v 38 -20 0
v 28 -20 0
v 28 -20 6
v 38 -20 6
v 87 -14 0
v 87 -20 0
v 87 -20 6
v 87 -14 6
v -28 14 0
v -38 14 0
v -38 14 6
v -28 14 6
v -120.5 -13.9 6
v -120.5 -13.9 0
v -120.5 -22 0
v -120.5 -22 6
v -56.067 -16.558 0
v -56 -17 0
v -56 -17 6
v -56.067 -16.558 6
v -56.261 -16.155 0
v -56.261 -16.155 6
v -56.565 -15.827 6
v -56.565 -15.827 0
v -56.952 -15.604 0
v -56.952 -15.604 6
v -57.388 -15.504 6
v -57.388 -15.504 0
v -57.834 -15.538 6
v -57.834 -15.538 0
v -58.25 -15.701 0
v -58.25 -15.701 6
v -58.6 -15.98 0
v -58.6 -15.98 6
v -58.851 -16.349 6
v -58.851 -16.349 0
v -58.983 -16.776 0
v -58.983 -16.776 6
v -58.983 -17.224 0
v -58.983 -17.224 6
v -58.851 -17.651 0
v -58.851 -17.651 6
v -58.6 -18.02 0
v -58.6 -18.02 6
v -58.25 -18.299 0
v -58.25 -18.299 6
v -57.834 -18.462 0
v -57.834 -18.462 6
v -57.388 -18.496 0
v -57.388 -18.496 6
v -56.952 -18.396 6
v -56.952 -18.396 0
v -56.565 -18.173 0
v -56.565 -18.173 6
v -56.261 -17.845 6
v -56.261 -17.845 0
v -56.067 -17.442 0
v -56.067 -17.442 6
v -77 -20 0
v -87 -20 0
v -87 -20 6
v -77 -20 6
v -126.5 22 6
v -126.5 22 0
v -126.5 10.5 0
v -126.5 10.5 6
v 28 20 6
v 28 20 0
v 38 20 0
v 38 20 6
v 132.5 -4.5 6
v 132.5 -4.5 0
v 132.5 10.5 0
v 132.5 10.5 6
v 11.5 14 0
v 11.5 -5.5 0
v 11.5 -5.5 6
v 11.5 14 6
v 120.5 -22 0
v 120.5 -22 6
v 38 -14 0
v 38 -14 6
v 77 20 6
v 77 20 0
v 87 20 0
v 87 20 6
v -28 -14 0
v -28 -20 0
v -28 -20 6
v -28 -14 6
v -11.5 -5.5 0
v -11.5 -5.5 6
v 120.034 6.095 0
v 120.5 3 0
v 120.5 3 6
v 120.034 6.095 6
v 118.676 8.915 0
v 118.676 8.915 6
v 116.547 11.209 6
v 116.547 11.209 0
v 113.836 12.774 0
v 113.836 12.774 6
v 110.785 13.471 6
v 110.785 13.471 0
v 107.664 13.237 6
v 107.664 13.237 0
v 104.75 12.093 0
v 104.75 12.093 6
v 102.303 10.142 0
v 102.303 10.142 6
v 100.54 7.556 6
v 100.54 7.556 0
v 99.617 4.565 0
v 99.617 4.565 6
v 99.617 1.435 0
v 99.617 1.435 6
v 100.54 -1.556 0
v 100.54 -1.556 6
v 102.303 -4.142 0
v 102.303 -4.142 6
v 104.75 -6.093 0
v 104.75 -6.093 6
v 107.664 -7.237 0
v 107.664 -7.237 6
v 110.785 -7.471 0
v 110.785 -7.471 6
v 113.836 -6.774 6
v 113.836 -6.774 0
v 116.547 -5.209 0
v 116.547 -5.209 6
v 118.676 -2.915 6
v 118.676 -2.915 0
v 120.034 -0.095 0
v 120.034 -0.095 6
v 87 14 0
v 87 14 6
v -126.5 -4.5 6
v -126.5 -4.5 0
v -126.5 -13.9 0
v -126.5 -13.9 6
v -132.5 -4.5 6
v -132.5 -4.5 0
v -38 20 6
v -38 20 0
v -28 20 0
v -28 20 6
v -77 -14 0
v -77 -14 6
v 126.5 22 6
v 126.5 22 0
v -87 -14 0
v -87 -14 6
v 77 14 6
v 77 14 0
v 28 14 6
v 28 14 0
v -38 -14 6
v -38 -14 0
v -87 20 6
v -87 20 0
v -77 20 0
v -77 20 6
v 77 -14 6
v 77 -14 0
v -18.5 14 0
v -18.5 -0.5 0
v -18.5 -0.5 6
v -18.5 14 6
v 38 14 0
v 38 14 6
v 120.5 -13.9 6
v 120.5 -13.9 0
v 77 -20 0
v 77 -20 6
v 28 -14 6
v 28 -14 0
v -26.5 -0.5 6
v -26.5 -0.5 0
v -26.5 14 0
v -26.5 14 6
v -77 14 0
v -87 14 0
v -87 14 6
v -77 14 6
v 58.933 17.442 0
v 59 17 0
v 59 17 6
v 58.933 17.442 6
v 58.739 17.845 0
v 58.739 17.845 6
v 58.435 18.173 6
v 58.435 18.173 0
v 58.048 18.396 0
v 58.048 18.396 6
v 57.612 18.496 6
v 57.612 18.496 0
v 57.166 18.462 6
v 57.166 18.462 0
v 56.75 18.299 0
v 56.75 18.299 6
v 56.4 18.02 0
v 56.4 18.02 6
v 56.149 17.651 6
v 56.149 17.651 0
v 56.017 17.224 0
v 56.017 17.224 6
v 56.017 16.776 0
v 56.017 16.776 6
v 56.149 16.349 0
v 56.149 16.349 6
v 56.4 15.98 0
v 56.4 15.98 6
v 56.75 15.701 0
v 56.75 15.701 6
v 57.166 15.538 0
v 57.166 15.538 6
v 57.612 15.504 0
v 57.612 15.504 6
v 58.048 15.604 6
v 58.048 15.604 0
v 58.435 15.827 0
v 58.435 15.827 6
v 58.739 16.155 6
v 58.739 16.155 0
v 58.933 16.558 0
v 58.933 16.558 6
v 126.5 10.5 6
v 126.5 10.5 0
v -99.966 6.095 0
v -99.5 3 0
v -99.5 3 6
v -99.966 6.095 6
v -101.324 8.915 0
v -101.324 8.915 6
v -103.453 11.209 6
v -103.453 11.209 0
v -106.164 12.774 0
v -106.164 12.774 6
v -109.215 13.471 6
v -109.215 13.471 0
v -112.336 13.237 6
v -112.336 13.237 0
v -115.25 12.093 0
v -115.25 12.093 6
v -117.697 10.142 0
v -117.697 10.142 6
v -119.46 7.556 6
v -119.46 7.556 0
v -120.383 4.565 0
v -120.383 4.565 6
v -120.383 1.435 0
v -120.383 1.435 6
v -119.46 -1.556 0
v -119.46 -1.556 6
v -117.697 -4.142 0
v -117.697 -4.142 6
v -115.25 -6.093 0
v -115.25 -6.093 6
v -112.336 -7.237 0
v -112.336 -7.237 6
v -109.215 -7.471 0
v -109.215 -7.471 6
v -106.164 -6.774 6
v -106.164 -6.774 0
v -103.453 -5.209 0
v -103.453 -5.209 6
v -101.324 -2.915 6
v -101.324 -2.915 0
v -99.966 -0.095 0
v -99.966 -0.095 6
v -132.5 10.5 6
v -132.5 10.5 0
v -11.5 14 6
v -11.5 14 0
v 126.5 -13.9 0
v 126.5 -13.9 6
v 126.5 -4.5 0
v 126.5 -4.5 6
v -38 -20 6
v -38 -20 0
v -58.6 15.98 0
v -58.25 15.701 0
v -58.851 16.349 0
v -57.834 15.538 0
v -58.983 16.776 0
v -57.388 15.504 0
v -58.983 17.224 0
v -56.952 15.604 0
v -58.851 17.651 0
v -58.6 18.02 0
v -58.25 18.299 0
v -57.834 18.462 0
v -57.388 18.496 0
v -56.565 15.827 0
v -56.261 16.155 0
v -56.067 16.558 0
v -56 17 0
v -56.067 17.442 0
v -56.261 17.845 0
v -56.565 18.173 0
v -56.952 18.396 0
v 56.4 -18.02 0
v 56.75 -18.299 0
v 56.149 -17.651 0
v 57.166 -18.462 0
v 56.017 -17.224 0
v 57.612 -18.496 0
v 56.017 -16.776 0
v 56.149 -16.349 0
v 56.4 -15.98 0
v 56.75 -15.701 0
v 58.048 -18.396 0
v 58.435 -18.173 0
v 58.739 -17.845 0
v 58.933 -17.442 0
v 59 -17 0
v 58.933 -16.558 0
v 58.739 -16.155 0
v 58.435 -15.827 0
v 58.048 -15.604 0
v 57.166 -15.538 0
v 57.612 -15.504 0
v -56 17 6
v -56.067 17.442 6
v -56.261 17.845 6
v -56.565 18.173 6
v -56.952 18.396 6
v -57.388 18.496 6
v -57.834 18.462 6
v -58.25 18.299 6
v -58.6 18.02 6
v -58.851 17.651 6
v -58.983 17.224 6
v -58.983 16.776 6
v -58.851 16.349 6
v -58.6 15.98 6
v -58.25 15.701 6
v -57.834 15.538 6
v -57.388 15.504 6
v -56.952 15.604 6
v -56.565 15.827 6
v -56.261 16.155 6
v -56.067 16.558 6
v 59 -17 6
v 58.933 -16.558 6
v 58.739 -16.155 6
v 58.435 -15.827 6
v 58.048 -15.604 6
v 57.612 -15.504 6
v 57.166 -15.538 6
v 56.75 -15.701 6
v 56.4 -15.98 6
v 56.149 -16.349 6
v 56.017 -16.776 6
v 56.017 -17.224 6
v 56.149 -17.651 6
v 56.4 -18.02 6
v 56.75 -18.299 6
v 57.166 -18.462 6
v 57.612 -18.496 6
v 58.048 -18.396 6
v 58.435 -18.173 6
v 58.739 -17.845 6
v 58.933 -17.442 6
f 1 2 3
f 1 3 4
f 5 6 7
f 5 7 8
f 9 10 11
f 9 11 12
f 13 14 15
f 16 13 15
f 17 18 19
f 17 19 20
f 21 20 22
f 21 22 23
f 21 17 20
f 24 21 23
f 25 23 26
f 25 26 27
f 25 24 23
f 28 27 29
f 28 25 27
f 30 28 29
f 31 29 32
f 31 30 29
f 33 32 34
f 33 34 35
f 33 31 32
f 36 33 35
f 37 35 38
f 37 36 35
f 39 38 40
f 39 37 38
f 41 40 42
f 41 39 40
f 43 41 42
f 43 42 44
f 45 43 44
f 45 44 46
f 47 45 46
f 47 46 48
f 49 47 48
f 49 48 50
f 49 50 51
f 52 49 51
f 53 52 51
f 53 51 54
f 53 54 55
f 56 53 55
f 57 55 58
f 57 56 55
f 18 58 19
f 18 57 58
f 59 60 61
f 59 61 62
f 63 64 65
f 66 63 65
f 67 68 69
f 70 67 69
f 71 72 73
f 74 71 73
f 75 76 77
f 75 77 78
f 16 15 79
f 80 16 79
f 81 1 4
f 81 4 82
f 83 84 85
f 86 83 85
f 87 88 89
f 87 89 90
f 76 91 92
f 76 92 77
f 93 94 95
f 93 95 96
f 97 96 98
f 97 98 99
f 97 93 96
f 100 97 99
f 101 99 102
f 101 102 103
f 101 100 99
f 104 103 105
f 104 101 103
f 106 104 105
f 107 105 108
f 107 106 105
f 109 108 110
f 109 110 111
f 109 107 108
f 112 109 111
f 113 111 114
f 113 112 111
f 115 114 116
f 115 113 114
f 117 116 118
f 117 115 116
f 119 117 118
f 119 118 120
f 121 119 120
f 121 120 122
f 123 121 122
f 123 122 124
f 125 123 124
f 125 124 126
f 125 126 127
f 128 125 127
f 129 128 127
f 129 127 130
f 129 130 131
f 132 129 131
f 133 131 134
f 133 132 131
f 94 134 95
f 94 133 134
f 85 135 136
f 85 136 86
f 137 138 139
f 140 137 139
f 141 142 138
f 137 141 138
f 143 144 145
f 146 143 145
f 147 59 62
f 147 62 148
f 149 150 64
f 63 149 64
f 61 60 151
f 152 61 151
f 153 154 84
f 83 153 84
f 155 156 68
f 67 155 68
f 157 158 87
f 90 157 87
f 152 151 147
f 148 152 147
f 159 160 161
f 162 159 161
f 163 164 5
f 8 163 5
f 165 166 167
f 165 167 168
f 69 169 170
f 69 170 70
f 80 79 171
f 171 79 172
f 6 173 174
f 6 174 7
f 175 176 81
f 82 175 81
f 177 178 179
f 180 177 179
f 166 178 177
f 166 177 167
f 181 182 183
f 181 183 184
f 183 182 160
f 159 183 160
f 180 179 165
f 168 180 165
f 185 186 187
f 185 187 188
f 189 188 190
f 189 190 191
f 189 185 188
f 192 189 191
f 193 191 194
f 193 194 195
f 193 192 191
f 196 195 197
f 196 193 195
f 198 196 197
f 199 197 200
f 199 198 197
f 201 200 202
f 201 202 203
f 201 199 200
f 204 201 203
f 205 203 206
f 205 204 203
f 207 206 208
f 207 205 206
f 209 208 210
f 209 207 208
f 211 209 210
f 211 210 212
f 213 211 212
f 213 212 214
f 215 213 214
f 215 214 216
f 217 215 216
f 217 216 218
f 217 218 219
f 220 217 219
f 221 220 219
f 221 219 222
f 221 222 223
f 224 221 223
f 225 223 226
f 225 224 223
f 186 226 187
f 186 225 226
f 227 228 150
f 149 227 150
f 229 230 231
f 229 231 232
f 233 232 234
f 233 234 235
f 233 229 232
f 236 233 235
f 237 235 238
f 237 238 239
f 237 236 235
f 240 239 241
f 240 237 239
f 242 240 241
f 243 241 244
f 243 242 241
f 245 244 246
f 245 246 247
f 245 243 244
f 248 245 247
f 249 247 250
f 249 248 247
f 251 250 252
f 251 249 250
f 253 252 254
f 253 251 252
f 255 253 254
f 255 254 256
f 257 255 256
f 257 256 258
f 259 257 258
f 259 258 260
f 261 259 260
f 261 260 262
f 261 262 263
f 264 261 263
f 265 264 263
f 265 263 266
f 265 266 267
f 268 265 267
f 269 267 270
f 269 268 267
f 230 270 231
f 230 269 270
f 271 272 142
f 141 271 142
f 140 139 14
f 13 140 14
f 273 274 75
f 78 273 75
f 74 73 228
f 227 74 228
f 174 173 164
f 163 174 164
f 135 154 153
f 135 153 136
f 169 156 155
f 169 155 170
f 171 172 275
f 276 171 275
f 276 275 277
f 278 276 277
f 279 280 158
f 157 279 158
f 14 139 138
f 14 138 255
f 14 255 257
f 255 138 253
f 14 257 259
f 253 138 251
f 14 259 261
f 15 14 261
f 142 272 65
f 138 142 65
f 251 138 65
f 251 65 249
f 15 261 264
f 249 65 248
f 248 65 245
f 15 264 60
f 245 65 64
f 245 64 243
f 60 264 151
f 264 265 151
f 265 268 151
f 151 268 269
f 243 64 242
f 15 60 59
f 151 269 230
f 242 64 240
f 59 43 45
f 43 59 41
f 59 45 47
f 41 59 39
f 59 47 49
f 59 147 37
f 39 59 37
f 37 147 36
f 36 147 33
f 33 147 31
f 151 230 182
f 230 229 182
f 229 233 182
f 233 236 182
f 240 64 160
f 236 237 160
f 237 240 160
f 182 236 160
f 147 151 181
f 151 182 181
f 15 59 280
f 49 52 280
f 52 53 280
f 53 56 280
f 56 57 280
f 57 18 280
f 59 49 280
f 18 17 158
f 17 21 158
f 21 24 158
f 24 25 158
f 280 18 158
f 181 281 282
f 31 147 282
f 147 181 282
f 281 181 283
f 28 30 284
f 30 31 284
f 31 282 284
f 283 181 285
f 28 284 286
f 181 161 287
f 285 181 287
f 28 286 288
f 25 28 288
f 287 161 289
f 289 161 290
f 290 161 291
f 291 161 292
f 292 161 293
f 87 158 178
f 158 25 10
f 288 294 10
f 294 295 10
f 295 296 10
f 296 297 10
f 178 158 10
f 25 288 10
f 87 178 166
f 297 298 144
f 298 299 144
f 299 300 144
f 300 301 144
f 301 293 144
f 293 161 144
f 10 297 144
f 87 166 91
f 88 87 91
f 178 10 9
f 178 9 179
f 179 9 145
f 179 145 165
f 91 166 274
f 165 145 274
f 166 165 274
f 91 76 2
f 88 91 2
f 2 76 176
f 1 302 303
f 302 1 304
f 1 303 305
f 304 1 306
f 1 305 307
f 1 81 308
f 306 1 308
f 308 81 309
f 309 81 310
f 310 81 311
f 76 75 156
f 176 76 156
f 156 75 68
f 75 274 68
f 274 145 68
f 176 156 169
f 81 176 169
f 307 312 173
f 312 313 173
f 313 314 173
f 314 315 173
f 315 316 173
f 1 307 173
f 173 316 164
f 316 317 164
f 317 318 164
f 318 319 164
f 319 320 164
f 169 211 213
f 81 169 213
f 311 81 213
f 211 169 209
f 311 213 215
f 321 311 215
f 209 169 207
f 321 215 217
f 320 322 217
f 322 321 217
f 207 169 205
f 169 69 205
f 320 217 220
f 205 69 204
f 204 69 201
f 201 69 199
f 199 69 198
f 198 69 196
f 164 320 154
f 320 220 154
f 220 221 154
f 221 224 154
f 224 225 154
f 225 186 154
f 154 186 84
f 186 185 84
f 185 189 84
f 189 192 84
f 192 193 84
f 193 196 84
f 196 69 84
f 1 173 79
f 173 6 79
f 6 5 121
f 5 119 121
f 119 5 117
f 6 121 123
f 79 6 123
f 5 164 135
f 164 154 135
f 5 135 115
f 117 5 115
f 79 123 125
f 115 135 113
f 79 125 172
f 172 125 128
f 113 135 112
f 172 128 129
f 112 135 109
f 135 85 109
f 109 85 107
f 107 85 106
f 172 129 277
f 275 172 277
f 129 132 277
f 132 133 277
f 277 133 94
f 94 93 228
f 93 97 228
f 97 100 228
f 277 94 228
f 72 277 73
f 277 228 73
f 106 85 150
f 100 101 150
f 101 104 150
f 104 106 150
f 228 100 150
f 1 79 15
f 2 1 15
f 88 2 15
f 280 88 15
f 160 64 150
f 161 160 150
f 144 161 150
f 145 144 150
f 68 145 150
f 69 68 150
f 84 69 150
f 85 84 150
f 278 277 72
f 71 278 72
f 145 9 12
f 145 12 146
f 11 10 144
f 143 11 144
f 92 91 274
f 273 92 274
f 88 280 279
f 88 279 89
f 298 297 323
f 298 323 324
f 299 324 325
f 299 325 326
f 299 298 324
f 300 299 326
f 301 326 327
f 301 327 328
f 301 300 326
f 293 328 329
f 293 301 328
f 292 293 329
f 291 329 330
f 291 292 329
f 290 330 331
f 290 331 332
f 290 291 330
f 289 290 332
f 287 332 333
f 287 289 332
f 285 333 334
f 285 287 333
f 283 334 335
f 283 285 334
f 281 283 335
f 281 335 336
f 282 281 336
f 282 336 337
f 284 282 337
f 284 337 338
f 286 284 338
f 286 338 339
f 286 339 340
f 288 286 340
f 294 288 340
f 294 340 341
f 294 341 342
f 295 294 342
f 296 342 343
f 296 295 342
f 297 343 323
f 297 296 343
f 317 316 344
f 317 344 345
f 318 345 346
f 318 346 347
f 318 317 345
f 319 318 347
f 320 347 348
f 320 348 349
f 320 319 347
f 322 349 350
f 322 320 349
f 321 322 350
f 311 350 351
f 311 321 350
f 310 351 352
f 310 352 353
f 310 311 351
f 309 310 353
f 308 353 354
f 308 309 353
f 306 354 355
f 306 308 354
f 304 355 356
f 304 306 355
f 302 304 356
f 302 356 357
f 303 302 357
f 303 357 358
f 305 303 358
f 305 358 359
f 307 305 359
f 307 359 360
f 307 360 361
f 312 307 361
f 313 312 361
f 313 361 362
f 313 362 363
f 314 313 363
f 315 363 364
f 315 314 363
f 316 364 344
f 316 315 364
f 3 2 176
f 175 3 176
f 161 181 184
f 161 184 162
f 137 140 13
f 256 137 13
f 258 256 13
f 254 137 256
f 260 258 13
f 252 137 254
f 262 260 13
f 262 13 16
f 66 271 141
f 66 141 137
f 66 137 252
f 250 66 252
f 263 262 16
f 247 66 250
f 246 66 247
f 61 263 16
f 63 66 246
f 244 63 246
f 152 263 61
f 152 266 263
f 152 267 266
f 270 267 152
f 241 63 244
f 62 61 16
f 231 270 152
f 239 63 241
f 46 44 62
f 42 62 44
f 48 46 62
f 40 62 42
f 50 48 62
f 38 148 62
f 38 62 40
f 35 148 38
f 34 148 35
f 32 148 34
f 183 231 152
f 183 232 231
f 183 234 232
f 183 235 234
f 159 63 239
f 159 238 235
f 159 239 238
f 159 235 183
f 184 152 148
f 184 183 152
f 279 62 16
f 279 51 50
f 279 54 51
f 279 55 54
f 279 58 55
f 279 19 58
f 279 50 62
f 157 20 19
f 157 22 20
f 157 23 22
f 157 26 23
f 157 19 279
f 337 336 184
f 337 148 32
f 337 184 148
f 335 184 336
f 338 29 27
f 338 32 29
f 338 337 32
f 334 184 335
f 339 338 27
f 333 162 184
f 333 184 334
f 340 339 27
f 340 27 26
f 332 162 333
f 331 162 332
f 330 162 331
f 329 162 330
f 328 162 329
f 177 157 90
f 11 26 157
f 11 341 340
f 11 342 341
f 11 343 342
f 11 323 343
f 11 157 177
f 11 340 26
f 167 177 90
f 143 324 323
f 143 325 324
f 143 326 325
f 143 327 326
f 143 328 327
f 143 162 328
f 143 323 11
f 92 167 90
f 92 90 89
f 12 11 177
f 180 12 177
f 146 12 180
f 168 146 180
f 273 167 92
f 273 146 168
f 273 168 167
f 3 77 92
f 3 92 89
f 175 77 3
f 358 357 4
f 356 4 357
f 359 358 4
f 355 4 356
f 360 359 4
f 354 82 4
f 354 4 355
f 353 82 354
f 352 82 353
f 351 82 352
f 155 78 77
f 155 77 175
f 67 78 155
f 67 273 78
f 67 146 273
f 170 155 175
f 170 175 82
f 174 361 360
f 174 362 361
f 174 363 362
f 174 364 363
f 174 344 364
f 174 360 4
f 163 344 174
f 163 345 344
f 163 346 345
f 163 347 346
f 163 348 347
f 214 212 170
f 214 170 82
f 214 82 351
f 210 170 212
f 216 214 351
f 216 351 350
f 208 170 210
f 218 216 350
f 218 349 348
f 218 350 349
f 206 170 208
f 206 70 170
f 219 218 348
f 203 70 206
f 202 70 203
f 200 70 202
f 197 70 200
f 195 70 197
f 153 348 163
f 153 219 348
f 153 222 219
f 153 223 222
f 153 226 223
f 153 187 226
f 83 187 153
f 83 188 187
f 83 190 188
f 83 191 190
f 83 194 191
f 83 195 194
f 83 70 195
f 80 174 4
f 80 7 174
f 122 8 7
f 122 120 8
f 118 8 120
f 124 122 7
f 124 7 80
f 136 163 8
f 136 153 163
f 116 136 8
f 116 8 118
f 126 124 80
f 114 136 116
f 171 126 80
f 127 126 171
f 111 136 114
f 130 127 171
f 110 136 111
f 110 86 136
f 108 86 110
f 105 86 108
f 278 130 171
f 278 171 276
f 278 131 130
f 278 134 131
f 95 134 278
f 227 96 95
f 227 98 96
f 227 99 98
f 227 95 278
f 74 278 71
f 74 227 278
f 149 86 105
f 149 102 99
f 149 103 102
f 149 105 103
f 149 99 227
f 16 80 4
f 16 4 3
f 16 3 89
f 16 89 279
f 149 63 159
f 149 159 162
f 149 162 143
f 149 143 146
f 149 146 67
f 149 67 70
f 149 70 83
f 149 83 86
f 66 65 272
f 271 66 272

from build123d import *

# Parameters (mm, degrees)
SKETCH_1_R      = 1.5
SKETCH_1_R_2    = 10.5
SKETCH_1_W      = 10
SKETCH_1_H      = 6
SKETCH_1_W_2    = 8
SKETCH_1_H_2    = 14.5
SKETCH_1_W_3    = 23
SKETCH_1_H_3    = 19.5
EXTRUDE_1_DEPTH = 6


with BuildPart() as part:
    # Эскиз1 → Бобышка-Вытянуть1 (new body)
    with BuildSketch(Plane.XY):
        Polygon((-126.5, 22), (-126.5, 10.5), (-132.5, 10.5), (-132.5, -4.5), (-126.5, -4.5), (-126.5, -13.9), (-120.5, -13.9), (-120.5, -22), (120.5, -22), (120.5, -13.9), (126.5, -13.9), (126.5, -4.5), (132.5, -4.5), (132.5, 10.5), (126.5, 10.5), (126.5, 22), align=None)
        with Locations((57.5, 17)):
            Circle(SKETCH_1_R, mode=Mode.SUBTRACT)
        with Locations((110, 3)):
            Circle(SKETCH_1_R_2, mode=Mode.SUBTRACT)
        with Locations((57.5, -17)):
            Circle(SKETCH_1_R, mode=Mode.SUBTRACT)
        with Locations((-57.5, 17)):
            Circle(SKETCH_1_R, mode=Mode.SUBTRACT)
        with Locations((-110, 3)):
            Circle(SKETCH_1_R_2, mode=Mode.SUBTRACT)
        with Locations((-57.5, -17)):
            Circle(SKETCH_1_R, mode=Mode.SUBTRACT)
        with Locations((33, 17)):
            Rectangle(SKETCH_1_W, SKETCH_1_H, mode=Mode.SUBTRACT)
        with Locations((82, 17)):
            Rectangle(SKETCH_1_W, SKETCH_1_H, mode=Mode.SUBTRACT)
        with Locations((33, -17)):
            Rectangle(SKETCH_1_W, SKETCH_1_H, mode=Mode.SUBTRACT)
        with Locations((82, -17)):
            Rectangle(SKETCH_1_W, SKETCH_1_H, mode=Mode.SUBTRACT)
        with Locations((-33, 17)):
            Rectangle(SKETCH_1_W, SKETCH_1_H, mode=Mode.SUBTRACT)
        with Locations((-82, 17)):
            Rectangle(SKETCH_1_W, SKETCH_1_H, mode=Mode.SUBTRACT)
        with Locations((-33, -17)):
            Rectangle(SKETCH_1_W, SKETCH_1_H, mode=Mode.SUBTRACT)
        with Locations((-82, -17)):
            Rectangle(SKETCH_1_W, SKETCH_1_H, mode=Mode.SUBTRACT)
        with Locations((-22.5, 6.749994)):
            Rectangle(SKETCH_1_W_2, SKETCH_1_H_2, mode=Mode.SUBTRACT)
        with Locations((2e-06, 4.249994)):
            Rectangle(SKETCH_1_W_3, SKETCH_1_H_3, mode=Mode.SUBTRACT)
    extrude(amount=EXTRUDE_1_DEPTH)


solid = part.part
